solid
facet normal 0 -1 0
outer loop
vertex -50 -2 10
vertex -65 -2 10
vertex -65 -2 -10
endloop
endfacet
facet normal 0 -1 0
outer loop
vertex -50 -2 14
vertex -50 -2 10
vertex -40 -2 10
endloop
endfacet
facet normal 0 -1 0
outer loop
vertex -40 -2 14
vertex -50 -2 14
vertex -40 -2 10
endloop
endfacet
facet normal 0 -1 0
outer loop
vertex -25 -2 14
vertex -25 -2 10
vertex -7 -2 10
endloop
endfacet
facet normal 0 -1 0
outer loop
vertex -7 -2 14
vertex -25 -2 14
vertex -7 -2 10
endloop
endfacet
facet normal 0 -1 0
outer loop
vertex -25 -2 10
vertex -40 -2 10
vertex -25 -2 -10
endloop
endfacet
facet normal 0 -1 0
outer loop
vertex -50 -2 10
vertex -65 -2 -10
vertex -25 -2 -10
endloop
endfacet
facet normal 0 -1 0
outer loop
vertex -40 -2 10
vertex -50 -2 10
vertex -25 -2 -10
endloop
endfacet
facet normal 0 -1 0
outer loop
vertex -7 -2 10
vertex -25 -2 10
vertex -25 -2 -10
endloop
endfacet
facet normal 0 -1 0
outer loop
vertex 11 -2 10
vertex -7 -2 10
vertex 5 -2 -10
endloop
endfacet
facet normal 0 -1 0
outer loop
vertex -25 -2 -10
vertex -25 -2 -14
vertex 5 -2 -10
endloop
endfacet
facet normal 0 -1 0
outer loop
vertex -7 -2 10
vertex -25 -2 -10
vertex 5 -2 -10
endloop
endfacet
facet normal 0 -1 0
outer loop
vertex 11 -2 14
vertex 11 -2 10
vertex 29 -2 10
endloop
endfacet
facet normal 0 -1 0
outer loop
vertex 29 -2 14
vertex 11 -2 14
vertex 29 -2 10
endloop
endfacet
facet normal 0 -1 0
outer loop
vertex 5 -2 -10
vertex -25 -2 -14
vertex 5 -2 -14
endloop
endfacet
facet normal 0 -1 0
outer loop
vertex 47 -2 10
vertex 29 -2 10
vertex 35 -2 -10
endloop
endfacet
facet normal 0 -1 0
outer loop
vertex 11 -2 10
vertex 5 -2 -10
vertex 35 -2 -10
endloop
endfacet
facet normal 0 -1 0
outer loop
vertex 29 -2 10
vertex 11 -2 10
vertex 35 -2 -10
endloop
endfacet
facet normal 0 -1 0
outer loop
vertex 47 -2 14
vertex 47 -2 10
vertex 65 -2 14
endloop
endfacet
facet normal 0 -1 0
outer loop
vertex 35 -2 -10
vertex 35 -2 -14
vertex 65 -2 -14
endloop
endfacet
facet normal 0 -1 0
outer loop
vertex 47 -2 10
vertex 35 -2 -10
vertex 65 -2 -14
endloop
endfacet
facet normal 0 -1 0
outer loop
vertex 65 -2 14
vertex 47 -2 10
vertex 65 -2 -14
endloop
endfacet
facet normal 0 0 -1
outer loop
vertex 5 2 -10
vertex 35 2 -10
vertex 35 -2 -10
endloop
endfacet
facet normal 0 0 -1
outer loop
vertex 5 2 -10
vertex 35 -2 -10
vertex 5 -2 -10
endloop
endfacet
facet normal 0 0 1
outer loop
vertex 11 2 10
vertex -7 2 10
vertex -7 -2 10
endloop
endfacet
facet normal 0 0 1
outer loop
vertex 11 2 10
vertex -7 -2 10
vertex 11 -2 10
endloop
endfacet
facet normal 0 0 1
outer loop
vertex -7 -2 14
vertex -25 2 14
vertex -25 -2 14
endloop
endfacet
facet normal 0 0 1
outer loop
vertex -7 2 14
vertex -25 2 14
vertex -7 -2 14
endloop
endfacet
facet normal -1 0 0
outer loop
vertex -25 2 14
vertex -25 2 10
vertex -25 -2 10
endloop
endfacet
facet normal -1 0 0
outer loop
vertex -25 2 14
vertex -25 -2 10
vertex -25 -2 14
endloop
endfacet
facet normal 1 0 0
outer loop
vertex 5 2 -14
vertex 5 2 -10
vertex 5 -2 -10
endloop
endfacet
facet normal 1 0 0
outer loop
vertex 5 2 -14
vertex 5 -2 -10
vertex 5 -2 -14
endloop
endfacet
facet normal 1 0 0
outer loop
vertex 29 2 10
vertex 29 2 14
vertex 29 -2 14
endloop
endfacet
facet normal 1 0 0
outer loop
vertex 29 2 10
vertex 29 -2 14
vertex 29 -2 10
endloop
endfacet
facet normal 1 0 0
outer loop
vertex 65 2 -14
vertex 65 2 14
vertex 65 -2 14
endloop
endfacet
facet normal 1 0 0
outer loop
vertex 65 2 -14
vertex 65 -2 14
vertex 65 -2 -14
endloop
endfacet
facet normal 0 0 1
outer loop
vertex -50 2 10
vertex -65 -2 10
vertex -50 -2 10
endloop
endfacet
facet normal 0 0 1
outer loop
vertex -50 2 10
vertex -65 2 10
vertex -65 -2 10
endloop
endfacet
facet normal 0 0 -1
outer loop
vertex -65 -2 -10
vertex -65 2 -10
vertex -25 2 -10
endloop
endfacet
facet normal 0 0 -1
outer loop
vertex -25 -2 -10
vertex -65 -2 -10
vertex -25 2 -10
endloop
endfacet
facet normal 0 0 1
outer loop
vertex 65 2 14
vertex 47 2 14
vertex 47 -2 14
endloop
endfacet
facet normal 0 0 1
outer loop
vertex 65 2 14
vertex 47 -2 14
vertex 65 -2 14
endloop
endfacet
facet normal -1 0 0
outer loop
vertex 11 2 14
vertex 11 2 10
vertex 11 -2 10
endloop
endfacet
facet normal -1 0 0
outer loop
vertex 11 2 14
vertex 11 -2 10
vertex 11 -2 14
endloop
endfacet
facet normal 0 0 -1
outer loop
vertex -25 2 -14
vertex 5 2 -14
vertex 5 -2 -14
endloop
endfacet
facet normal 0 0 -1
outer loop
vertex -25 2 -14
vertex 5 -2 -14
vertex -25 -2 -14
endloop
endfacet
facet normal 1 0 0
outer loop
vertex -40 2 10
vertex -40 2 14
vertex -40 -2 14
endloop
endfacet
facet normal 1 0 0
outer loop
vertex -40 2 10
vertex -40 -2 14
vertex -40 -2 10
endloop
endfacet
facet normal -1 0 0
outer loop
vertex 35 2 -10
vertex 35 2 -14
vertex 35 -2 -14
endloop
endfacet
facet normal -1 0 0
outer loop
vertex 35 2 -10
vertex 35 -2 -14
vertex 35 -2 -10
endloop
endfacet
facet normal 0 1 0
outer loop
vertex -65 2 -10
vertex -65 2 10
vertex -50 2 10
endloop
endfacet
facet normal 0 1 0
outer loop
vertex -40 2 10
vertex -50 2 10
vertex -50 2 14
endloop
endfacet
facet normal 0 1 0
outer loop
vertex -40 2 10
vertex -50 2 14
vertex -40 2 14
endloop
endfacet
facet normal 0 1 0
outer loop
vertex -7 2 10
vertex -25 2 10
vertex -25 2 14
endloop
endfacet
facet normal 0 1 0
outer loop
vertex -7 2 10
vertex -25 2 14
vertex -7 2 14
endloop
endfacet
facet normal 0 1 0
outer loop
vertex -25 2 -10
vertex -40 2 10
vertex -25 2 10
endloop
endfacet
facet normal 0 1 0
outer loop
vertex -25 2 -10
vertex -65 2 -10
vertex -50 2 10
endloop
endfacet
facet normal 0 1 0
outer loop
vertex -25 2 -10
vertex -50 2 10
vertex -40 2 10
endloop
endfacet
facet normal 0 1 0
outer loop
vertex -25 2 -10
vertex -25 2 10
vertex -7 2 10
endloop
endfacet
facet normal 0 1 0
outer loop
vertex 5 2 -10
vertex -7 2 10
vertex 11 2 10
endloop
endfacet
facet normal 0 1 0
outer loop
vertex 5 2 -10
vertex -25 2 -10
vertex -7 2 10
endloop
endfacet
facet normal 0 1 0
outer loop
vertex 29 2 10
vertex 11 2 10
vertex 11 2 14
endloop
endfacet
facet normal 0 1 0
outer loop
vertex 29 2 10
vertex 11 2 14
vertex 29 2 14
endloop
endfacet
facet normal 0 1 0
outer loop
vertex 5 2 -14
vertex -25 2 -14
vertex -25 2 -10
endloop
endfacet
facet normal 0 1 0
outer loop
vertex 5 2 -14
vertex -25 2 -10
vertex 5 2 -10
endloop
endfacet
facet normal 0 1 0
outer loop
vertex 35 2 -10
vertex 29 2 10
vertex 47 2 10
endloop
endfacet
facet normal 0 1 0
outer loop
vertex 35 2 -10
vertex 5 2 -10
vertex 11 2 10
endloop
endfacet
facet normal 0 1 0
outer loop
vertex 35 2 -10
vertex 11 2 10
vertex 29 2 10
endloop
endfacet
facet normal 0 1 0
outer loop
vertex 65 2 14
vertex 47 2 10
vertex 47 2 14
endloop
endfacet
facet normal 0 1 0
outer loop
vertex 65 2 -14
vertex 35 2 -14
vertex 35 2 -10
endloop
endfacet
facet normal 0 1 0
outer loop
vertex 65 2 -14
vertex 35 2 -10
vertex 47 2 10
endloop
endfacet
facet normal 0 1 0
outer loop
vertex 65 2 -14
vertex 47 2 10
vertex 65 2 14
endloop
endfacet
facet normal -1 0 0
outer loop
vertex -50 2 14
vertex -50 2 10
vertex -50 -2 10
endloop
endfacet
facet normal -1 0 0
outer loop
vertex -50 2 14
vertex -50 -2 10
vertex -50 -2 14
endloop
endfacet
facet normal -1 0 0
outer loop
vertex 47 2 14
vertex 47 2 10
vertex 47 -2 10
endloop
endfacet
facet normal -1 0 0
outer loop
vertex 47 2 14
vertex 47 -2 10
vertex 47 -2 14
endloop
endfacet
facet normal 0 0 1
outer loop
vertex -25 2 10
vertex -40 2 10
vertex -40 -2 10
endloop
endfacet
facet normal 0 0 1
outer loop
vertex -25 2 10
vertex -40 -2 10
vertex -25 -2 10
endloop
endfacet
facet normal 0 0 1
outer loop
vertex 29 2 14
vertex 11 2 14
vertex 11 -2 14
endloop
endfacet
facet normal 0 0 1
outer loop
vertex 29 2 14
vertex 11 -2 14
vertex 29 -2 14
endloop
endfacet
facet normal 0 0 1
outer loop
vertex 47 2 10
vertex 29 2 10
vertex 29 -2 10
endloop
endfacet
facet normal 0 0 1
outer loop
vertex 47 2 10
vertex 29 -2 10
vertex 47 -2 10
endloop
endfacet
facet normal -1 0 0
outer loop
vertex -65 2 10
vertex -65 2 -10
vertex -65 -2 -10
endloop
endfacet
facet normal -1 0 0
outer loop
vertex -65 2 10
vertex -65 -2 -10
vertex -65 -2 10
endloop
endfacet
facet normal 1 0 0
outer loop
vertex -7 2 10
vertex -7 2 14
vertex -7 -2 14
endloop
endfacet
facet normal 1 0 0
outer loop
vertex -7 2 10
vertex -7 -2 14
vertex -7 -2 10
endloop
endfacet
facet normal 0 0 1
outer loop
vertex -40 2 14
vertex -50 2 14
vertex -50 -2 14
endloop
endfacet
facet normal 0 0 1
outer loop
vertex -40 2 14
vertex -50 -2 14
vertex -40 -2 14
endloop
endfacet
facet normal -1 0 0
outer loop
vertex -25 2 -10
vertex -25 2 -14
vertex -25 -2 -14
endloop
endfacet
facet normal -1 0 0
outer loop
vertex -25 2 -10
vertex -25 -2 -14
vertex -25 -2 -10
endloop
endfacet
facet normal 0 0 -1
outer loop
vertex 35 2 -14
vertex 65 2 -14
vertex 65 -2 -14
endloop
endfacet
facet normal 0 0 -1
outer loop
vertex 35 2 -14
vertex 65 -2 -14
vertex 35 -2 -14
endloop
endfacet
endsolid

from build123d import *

# Parameters (mm, degrees)
BOSS_EXTRUDE1_DEPTH = 2
SKETCH3_W           = 10
SKETCH3_H           = 4
CUT_EXTRUDE2_DEPTH  = 67.610809934


with BuildPart() as part:
    # Sketch1 → Boss-Extrude1 (new, symmetric)
    with BuildSketch(Plane(origin=(0, 0, 0), x_dir=(1, 0, 0), z_dir=(0, 1, 0))):
        Polygon((-65, -10), (-50, -10), (-50, -14), (-40, -14), (-40, -10), (-25, -10), (-25, -14), (-7, -14), (-7, -10), (11, -10), (11, -14), (29, -14), (29, -10), (47, -10), (47, -14), (65, -14), (65, -10), (65, 10), (65, 14), (35, 14), (35, 10), (5, 10), (5, 14), (-25, 14), (-25, 10), (-55, 10), (-55, 14), (-65, 14), (-65, 10), align=None)
    extrude(amount=BOSS_EXTRUDE1_DEPTH, both=True)

    # Sketch3 → Cut-Extrude2 (cut, through all)
    with BuildSketch(Plane(origin=(0, 2, 0), x_dir=(1, 0, 0), z_dir=(0, 1, 0))):
        with Locations((-60, 12)):
            Rectangle(SKETCH3_W, SKETCH3_H)
    extrude(amount=-CUT_EXTRUDE2_DEPTH, mode=Mode.SUBTRACT)


solid = part.part
